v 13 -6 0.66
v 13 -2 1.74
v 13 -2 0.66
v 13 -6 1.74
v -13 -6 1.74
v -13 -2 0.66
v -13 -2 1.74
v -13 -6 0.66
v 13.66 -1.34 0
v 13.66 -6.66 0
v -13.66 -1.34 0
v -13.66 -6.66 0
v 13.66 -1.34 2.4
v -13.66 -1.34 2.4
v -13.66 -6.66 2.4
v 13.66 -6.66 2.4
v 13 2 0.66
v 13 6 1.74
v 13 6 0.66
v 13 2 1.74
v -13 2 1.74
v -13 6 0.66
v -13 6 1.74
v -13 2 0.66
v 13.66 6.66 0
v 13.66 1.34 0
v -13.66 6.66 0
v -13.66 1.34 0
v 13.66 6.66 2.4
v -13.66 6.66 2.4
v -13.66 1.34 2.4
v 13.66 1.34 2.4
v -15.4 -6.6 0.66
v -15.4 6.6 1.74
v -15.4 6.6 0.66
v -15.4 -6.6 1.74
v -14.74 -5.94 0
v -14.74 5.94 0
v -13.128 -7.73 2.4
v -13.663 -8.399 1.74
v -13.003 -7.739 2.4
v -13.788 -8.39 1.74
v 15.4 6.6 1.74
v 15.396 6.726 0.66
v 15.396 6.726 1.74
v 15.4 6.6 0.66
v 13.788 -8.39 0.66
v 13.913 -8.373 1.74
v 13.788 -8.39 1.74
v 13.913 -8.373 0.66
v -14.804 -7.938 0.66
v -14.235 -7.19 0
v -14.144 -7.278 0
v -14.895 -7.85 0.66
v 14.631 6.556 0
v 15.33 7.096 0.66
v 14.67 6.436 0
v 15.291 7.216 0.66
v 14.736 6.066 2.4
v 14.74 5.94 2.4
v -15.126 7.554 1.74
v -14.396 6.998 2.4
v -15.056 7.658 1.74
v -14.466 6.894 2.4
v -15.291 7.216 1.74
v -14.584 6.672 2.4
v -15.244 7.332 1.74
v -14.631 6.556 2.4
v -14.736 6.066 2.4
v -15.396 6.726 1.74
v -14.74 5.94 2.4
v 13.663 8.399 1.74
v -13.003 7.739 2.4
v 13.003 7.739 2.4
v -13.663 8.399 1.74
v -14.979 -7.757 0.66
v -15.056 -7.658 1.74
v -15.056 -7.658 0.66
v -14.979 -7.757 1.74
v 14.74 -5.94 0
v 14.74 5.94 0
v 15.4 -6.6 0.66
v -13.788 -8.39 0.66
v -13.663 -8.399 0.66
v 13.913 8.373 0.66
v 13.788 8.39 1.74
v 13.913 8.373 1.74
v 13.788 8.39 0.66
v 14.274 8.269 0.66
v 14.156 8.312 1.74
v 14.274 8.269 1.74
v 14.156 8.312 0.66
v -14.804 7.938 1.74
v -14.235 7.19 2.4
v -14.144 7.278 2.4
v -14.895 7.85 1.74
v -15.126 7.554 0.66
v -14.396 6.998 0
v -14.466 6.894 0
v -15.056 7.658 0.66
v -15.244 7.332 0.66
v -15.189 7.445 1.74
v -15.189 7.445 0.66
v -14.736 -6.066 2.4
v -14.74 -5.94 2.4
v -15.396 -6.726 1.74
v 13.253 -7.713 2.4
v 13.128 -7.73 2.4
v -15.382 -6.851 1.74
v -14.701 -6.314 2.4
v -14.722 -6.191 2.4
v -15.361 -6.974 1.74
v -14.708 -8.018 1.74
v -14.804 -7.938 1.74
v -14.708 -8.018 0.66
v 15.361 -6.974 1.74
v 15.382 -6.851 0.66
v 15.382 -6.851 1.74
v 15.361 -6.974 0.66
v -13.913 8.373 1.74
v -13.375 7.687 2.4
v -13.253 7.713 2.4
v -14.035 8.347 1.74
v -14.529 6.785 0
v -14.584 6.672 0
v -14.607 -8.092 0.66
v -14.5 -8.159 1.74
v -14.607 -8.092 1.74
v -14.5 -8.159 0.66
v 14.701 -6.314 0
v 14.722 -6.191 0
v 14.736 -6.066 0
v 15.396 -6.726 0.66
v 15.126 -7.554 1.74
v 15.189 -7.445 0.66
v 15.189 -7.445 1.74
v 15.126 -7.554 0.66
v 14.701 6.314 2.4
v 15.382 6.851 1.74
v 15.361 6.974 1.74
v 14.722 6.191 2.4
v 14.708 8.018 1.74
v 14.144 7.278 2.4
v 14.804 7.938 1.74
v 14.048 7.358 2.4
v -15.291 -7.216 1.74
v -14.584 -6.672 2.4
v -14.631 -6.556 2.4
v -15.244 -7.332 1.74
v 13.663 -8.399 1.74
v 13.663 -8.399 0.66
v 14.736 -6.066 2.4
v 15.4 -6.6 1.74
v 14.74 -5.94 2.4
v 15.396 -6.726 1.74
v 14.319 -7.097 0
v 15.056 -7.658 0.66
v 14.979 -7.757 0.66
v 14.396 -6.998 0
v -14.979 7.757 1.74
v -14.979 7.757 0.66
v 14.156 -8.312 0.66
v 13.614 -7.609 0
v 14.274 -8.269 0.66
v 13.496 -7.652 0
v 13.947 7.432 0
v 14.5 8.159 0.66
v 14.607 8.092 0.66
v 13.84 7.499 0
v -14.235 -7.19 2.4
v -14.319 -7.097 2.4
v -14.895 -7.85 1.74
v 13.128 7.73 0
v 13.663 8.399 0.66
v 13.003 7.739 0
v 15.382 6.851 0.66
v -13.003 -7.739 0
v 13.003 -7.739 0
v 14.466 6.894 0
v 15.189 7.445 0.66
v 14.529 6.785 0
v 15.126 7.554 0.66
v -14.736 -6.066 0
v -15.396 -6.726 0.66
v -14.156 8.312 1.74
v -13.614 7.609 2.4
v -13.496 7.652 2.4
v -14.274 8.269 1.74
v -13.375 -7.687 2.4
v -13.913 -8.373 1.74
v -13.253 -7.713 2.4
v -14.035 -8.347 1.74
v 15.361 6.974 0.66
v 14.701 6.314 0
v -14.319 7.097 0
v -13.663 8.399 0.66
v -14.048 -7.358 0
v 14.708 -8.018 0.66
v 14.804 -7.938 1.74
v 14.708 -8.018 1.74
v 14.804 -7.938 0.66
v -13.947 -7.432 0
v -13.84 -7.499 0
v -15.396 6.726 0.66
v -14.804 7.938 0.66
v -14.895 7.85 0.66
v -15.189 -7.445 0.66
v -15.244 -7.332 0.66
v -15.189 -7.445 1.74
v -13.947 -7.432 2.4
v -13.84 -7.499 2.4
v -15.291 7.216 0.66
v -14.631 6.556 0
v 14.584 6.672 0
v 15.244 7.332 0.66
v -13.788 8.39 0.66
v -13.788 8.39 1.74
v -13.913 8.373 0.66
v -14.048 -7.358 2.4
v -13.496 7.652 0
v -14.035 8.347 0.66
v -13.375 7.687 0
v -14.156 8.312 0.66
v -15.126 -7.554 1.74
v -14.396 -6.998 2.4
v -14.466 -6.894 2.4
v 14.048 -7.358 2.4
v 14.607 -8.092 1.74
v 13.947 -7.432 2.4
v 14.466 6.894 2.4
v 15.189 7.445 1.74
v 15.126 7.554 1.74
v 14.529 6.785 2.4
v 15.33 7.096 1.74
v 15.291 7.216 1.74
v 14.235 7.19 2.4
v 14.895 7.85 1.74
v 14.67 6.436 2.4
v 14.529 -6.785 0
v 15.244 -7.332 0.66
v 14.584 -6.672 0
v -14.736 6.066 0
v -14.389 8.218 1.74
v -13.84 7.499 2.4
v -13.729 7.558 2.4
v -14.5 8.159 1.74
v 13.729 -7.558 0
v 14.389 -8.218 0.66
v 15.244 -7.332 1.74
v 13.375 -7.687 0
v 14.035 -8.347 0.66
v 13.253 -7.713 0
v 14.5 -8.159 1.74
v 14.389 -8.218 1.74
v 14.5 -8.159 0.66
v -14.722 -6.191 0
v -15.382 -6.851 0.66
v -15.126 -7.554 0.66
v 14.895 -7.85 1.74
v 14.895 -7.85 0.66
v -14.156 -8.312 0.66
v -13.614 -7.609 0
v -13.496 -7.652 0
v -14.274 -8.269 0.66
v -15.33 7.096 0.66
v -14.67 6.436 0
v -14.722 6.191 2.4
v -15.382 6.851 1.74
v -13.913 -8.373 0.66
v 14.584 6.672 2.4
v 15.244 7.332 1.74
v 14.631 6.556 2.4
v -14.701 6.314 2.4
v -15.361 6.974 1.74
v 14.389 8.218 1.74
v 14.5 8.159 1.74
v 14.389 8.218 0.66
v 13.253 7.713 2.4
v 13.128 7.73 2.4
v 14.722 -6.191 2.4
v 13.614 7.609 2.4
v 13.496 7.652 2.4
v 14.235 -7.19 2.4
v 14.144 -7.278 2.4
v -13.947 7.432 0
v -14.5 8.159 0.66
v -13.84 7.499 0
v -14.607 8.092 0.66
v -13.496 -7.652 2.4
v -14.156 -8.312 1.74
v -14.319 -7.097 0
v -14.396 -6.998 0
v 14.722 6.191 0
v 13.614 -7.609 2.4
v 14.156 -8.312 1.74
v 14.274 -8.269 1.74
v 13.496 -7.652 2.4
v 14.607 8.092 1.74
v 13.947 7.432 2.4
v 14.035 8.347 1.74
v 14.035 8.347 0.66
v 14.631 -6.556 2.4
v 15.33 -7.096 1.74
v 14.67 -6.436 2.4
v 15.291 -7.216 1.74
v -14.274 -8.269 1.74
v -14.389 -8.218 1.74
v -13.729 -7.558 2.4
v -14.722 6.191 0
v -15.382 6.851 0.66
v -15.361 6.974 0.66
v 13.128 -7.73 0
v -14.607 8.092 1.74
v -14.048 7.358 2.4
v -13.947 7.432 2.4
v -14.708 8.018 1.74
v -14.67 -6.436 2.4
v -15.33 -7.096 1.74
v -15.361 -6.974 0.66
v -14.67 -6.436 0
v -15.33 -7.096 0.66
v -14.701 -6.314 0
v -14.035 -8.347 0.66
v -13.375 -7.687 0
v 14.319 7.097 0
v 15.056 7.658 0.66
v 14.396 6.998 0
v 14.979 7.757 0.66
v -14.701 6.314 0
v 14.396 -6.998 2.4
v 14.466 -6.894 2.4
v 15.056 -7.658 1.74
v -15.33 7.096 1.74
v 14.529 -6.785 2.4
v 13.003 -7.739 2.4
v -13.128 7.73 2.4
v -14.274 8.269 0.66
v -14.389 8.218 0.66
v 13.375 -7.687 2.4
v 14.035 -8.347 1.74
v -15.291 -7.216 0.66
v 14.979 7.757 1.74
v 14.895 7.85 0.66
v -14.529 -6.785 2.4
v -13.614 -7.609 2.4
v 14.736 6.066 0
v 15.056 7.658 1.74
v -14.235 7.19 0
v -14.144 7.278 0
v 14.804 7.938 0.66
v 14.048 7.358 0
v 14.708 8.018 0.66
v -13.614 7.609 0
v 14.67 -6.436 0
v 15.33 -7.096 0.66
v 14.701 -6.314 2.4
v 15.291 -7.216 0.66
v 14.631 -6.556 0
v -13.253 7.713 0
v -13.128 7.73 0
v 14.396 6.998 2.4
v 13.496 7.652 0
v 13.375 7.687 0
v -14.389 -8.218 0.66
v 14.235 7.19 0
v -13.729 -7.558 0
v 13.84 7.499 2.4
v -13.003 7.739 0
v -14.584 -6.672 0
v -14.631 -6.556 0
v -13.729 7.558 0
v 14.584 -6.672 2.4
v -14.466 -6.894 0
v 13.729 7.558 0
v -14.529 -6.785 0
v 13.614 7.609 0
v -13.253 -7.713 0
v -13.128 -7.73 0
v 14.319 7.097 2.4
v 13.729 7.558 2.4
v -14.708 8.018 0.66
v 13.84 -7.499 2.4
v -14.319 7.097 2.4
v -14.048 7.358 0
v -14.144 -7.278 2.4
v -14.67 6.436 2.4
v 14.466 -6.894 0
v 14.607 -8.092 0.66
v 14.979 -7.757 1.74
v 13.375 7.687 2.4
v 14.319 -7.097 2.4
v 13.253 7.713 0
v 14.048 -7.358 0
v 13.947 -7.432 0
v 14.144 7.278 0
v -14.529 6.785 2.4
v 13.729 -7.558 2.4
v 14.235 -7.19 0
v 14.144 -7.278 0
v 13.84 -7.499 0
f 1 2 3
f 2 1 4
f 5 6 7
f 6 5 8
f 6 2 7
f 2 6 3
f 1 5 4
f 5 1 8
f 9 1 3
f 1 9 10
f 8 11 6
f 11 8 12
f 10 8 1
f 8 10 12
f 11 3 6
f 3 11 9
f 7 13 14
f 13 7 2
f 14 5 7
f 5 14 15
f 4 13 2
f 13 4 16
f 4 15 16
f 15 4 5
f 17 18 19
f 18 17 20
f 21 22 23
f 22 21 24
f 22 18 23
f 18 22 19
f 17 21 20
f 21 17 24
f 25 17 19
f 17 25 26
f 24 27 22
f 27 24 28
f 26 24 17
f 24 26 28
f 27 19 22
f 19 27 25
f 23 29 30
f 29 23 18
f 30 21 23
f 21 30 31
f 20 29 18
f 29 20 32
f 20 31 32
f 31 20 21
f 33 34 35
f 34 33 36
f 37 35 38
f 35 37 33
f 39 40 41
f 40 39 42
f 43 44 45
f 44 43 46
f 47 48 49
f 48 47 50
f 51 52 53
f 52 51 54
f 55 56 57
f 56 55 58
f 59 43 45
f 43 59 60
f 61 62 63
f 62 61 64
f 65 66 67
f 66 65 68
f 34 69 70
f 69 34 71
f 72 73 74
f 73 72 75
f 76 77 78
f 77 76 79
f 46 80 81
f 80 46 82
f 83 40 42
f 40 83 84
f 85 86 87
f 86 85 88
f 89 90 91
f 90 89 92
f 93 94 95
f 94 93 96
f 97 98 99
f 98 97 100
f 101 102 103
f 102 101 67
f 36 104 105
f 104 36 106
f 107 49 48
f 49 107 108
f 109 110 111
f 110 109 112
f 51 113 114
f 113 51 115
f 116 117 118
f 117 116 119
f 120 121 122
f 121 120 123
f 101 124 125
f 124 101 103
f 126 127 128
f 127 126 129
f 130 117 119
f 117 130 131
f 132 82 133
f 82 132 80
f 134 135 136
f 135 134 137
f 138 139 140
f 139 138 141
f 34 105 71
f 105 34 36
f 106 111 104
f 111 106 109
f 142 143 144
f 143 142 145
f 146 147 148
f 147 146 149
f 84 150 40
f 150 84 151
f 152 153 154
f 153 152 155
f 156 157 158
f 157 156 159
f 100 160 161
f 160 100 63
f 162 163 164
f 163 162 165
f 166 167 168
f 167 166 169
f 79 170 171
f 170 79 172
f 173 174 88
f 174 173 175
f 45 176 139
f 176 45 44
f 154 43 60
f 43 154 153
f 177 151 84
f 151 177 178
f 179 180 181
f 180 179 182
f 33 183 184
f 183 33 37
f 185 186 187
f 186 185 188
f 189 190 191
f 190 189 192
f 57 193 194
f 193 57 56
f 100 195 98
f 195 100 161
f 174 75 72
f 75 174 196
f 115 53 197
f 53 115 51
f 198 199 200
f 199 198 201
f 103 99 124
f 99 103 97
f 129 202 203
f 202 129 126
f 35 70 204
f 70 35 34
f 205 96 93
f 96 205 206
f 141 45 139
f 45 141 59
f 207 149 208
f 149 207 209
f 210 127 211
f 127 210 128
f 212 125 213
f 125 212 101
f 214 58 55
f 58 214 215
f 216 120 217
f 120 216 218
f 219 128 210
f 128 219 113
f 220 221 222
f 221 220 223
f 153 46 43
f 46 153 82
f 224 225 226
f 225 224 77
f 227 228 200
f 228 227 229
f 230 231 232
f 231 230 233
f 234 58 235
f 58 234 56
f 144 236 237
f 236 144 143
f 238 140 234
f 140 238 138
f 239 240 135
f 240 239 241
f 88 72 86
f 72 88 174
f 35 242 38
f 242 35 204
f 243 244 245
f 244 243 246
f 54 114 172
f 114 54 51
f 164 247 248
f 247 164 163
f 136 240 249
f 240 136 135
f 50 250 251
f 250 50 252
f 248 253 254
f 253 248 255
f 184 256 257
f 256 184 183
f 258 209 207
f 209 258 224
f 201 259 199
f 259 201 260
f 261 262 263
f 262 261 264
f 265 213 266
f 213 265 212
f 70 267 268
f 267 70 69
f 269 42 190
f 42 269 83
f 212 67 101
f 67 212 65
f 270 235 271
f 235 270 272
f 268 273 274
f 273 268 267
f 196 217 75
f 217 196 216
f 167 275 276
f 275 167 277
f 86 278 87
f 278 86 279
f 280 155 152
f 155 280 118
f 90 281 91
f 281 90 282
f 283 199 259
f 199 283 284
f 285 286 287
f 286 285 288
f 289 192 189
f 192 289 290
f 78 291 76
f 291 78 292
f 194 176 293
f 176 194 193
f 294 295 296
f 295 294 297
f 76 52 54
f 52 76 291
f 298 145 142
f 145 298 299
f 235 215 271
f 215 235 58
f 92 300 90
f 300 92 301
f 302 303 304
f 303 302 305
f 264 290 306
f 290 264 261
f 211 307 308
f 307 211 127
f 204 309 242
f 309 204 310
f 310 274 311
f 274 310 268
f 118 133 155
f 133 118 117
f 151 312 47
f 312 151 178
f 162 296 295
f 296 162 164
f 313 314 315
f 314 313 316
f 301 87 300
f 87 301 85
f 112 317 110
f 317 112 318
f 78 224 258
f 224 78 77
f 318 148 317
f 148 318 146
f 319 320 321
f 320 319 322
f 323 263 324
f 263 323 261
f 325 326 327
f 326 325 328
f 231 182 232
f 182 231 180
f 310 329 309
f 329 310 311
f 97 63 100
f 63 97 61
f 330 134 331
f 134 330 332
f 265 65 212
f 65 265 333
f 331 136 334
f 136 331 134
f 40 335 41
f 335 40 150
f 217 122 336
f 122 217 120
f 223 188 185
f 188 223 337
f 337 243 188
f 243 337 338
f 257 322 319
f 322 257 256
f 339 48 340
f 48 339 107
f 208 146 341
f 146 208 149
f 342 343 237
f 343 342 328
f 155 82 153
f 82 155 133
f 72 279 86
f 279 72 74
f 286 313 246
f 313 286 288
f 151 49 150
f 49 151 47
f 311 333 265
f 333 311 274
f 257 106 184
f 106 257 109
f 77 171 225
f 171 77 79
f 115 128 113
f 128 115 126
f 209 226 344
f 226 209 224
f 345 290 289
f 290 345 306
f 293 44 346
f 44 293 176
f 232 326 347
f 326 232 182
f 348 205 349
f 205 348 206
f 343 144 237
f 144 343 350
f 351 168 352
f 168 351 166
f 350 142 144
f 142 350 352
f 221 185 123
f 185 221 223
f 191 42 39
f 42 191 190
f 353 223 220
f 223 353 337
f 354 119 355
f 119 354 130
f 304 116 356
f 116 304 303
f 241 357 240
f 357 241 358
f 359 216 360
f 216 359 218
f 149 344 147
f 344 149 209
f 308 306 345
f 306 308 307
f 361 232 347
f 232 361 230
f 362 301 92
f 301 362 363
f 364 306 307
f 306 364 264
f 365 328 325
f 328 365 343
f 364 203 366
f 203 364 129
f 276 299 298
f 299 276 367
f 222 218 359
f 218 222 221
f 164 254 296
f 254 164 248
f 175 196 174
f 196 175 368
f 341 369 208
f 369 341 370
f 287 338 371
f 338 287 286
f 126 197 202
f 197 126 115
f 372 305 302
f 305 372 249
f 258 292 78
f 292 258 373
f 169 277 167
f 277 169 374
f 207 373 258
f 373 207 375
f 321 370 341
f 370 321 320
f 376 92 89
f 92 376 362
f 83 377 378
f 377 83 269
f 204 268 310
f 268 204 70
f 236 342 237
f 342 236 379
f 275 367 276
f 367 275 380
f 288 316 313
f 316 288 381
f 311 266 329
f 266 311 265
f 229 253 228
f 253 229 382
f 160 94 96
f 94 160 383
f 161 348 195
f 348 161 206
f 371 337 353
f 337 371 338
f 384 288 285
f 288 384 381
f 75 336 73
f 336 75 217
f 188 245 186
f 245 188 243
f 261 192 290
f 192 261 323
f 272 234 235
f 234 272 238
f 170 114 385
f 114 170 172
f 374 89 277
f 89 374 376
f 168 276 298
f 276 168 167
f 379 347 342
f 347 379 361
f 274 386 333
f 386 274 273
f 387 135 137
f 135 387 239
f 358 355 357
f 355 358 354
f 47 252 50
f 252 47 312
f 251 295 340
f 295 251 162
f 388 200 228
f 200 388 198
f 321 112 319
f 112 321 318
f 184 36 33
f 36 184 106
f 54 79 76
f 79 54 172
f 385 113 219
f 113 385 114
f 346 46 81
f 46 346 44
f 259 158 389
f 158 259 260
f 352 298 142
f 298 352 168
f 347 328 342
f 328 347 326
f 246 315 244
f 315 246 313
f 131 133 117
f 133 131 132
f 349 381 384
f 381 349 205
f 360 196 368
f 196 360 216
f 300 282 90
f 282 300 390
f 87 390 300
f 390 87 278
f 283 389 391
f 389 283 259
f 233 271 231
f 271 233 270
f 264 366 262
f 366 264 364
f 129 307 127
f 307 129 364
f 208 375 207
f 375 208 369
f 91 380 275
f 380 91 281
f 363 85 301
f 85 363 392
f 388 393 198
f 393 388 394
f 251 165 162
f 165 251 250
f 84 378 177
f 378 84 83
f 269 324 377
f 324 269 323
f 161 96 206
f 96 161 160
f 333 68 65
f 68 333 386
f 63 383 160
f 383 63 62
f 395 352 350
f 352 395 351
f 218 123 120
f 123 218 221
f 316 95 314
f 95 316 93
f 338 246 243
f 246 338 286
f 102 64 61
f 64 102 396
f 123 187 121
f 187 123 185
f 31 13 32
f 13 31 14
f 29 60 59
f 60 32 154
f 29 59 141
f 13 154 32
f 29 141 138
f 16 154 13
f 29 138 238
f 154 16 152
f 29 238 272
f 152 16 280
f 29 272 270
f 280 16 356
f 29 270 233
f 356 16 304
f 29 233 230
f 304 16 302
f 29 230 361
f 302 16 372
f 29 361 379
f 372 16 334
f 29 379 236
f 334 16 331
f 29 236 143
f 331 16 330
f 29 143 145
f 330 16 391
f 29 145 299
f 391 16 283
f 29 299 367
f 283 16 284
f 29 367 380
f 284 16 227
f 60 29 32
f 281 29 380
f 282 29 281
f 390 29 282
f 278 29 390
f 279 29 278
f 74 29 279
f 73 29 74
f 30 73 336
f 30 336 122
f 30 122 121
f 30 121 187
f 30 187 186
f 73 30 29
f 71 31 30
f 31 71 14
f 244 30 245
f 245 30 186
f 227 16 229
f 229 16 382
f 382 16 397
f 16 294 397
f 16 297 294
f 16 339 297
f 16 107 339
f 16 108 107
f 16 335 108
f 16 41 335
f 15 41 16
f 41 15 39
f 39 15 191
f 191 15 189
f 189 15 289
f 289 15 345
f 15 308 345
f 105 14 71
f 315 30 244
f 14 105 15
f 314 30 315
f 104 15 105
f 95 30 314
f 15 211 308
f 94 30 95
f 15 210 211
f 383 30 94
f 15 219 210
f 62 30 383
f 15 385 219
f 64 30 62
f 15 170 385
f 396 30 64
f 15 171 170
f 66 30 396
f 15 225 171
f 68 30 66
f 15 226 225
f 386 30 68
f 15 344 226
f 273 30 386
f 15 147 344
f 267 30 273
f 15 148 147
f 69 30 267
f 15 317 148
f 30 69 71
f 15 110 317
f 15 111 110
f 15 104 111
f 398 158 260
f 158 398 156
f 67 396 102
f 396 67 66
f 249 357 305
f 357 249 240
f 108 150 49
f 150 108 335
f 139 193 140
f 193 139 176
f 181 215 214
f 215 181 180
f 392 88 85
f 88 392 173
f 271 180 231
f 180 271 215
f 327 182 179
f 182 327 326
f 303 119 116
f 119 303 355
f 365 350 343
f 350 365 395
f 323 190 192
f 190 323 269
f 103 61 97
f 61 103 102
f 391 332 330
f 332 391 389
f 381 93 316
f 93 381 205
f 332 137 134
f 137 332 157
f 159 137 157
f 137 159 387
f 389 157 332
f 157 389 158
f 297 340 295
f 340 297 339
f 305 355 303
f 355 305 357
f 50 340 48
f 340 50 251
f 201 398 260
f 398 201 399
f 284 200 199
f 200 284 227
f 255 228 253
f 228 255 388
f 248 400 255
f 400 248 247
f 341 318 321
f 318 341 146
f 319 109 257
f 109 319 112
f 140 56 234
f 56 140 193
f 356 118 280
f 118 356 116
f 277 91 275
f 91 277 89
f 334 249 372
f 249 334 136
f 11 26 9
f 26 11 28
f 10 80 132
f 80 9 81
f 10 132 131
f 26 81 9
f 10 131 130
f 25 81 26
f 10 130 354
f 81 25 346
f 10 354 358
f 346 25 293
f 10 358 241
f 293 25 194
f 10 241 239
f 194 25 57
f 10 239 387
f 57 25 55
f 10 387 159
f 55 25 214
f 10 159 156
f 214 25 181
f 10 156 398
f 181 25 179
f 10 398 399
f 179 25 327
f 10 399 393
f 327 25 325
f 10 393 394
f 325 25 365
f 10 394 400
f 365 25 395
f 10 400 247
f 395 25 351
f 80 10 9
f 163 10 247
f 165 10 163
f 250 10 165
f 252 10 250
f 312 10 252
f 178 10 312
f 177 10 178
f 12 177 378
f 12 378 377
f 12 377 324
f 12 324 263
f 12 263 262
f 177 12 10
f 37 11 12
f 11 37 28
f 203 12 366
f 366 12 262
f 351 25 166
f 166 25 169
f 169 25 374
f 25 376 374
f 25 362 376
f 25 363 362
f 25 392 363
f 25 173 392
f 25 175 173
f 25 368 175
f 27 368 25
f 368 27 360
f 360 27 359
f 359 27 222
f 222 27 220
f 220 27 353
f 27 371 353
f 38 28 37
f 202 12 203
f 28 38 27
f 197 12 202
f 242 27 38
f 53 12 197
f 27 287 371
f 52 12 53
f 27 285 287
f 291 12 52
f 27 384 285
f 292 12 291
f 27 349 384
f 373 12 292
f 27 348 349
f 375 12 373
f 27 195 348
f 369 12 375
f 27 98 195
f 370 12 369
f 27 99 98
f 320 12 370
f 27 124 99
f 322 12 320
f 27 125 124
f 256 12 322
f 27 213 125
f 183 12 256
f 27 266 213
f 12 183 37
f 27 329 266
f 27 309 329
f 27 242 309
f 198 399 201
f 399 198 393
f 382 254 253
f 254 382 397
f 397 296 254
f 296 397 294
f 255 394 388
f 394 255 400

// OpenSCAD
//=== Flat Tri Glide ===//

//width of the webbing opening (1in = 25.4 mm)
_1_webbingWidth = 26;

// width of the gap for the webbing
_2_webbingGap = 4;

// thickness of the edge
_3_edgeThickness = 2.4;

// thickness of the center beam
_4_centerThickness = 4;

// height of the tri glide
_5_height = 2.4;

// percent corner rounding
_6_cornerRounding = 75; // [1:100]

// ho much to break off the edges
_7_cornerBreakage = 0.66;


module makeBody(xsize, ysize, height, radius) {
	translate([0,0,height/2]) {
		minkowski() {
			cube(size=[xsize-2*radius,ysize-2*radius, height/2], center = true);
			cylinder(r=radius, h=height/2, center=true);
		}
	}
}

module makeCuts(width, gap, thickness, height,b) {
	offset = (thickness+gap)/2;
	for (y = [-offset, offset]) {
		translate([0, y, 0]) {

			translate([0, 0, height/2])
				cube(size=[width, gap, height*2], center=true);
			translate([0, 0, 0])
				makeCutEnd(width, gap, thickness, height,b);
			translate([0, 0, height]) scale([1,1,-1])
				makeCutEnd(width, gap, thickness, height,b);
		}
	}
}

module makeCutEnd(width, gap, thickness, height,b)
{
	hull(){
		translate([0,0,+b/2])
			cube(size=[width, gap, b], center=true);
		translate([0,0,-b/2])
			cube(size=[width+2*b, gap+2*b, b], center=true);			
	}
}

module makeTriGlide(width, gap, edgeThickness, centerThickness, height, rounding, b, $fn=90) {
	xsize = width + edgeThickness * 2;
	ysize = centerThickness + edgeThickness * 2 + gap * 2;
	radius = edgeThickness*(rounding/100);
	difference() {
        hull()
        {
		  makeBody(xsize-2*b, ysize-2*b, height, radius);
          translate([0,0,b])
		  makeBody(xsize, ysize, height-2*b, radius);
        }
		makeCuts(width, gap, centerThickness, height,b);
	}
}


makeTriGlide(_1_webbingWidth, _2_webbingGap, _3_edgeThickness, _4_centerThickness, _5_height, _6_cornerRounding,_7_cornerBreakage);
